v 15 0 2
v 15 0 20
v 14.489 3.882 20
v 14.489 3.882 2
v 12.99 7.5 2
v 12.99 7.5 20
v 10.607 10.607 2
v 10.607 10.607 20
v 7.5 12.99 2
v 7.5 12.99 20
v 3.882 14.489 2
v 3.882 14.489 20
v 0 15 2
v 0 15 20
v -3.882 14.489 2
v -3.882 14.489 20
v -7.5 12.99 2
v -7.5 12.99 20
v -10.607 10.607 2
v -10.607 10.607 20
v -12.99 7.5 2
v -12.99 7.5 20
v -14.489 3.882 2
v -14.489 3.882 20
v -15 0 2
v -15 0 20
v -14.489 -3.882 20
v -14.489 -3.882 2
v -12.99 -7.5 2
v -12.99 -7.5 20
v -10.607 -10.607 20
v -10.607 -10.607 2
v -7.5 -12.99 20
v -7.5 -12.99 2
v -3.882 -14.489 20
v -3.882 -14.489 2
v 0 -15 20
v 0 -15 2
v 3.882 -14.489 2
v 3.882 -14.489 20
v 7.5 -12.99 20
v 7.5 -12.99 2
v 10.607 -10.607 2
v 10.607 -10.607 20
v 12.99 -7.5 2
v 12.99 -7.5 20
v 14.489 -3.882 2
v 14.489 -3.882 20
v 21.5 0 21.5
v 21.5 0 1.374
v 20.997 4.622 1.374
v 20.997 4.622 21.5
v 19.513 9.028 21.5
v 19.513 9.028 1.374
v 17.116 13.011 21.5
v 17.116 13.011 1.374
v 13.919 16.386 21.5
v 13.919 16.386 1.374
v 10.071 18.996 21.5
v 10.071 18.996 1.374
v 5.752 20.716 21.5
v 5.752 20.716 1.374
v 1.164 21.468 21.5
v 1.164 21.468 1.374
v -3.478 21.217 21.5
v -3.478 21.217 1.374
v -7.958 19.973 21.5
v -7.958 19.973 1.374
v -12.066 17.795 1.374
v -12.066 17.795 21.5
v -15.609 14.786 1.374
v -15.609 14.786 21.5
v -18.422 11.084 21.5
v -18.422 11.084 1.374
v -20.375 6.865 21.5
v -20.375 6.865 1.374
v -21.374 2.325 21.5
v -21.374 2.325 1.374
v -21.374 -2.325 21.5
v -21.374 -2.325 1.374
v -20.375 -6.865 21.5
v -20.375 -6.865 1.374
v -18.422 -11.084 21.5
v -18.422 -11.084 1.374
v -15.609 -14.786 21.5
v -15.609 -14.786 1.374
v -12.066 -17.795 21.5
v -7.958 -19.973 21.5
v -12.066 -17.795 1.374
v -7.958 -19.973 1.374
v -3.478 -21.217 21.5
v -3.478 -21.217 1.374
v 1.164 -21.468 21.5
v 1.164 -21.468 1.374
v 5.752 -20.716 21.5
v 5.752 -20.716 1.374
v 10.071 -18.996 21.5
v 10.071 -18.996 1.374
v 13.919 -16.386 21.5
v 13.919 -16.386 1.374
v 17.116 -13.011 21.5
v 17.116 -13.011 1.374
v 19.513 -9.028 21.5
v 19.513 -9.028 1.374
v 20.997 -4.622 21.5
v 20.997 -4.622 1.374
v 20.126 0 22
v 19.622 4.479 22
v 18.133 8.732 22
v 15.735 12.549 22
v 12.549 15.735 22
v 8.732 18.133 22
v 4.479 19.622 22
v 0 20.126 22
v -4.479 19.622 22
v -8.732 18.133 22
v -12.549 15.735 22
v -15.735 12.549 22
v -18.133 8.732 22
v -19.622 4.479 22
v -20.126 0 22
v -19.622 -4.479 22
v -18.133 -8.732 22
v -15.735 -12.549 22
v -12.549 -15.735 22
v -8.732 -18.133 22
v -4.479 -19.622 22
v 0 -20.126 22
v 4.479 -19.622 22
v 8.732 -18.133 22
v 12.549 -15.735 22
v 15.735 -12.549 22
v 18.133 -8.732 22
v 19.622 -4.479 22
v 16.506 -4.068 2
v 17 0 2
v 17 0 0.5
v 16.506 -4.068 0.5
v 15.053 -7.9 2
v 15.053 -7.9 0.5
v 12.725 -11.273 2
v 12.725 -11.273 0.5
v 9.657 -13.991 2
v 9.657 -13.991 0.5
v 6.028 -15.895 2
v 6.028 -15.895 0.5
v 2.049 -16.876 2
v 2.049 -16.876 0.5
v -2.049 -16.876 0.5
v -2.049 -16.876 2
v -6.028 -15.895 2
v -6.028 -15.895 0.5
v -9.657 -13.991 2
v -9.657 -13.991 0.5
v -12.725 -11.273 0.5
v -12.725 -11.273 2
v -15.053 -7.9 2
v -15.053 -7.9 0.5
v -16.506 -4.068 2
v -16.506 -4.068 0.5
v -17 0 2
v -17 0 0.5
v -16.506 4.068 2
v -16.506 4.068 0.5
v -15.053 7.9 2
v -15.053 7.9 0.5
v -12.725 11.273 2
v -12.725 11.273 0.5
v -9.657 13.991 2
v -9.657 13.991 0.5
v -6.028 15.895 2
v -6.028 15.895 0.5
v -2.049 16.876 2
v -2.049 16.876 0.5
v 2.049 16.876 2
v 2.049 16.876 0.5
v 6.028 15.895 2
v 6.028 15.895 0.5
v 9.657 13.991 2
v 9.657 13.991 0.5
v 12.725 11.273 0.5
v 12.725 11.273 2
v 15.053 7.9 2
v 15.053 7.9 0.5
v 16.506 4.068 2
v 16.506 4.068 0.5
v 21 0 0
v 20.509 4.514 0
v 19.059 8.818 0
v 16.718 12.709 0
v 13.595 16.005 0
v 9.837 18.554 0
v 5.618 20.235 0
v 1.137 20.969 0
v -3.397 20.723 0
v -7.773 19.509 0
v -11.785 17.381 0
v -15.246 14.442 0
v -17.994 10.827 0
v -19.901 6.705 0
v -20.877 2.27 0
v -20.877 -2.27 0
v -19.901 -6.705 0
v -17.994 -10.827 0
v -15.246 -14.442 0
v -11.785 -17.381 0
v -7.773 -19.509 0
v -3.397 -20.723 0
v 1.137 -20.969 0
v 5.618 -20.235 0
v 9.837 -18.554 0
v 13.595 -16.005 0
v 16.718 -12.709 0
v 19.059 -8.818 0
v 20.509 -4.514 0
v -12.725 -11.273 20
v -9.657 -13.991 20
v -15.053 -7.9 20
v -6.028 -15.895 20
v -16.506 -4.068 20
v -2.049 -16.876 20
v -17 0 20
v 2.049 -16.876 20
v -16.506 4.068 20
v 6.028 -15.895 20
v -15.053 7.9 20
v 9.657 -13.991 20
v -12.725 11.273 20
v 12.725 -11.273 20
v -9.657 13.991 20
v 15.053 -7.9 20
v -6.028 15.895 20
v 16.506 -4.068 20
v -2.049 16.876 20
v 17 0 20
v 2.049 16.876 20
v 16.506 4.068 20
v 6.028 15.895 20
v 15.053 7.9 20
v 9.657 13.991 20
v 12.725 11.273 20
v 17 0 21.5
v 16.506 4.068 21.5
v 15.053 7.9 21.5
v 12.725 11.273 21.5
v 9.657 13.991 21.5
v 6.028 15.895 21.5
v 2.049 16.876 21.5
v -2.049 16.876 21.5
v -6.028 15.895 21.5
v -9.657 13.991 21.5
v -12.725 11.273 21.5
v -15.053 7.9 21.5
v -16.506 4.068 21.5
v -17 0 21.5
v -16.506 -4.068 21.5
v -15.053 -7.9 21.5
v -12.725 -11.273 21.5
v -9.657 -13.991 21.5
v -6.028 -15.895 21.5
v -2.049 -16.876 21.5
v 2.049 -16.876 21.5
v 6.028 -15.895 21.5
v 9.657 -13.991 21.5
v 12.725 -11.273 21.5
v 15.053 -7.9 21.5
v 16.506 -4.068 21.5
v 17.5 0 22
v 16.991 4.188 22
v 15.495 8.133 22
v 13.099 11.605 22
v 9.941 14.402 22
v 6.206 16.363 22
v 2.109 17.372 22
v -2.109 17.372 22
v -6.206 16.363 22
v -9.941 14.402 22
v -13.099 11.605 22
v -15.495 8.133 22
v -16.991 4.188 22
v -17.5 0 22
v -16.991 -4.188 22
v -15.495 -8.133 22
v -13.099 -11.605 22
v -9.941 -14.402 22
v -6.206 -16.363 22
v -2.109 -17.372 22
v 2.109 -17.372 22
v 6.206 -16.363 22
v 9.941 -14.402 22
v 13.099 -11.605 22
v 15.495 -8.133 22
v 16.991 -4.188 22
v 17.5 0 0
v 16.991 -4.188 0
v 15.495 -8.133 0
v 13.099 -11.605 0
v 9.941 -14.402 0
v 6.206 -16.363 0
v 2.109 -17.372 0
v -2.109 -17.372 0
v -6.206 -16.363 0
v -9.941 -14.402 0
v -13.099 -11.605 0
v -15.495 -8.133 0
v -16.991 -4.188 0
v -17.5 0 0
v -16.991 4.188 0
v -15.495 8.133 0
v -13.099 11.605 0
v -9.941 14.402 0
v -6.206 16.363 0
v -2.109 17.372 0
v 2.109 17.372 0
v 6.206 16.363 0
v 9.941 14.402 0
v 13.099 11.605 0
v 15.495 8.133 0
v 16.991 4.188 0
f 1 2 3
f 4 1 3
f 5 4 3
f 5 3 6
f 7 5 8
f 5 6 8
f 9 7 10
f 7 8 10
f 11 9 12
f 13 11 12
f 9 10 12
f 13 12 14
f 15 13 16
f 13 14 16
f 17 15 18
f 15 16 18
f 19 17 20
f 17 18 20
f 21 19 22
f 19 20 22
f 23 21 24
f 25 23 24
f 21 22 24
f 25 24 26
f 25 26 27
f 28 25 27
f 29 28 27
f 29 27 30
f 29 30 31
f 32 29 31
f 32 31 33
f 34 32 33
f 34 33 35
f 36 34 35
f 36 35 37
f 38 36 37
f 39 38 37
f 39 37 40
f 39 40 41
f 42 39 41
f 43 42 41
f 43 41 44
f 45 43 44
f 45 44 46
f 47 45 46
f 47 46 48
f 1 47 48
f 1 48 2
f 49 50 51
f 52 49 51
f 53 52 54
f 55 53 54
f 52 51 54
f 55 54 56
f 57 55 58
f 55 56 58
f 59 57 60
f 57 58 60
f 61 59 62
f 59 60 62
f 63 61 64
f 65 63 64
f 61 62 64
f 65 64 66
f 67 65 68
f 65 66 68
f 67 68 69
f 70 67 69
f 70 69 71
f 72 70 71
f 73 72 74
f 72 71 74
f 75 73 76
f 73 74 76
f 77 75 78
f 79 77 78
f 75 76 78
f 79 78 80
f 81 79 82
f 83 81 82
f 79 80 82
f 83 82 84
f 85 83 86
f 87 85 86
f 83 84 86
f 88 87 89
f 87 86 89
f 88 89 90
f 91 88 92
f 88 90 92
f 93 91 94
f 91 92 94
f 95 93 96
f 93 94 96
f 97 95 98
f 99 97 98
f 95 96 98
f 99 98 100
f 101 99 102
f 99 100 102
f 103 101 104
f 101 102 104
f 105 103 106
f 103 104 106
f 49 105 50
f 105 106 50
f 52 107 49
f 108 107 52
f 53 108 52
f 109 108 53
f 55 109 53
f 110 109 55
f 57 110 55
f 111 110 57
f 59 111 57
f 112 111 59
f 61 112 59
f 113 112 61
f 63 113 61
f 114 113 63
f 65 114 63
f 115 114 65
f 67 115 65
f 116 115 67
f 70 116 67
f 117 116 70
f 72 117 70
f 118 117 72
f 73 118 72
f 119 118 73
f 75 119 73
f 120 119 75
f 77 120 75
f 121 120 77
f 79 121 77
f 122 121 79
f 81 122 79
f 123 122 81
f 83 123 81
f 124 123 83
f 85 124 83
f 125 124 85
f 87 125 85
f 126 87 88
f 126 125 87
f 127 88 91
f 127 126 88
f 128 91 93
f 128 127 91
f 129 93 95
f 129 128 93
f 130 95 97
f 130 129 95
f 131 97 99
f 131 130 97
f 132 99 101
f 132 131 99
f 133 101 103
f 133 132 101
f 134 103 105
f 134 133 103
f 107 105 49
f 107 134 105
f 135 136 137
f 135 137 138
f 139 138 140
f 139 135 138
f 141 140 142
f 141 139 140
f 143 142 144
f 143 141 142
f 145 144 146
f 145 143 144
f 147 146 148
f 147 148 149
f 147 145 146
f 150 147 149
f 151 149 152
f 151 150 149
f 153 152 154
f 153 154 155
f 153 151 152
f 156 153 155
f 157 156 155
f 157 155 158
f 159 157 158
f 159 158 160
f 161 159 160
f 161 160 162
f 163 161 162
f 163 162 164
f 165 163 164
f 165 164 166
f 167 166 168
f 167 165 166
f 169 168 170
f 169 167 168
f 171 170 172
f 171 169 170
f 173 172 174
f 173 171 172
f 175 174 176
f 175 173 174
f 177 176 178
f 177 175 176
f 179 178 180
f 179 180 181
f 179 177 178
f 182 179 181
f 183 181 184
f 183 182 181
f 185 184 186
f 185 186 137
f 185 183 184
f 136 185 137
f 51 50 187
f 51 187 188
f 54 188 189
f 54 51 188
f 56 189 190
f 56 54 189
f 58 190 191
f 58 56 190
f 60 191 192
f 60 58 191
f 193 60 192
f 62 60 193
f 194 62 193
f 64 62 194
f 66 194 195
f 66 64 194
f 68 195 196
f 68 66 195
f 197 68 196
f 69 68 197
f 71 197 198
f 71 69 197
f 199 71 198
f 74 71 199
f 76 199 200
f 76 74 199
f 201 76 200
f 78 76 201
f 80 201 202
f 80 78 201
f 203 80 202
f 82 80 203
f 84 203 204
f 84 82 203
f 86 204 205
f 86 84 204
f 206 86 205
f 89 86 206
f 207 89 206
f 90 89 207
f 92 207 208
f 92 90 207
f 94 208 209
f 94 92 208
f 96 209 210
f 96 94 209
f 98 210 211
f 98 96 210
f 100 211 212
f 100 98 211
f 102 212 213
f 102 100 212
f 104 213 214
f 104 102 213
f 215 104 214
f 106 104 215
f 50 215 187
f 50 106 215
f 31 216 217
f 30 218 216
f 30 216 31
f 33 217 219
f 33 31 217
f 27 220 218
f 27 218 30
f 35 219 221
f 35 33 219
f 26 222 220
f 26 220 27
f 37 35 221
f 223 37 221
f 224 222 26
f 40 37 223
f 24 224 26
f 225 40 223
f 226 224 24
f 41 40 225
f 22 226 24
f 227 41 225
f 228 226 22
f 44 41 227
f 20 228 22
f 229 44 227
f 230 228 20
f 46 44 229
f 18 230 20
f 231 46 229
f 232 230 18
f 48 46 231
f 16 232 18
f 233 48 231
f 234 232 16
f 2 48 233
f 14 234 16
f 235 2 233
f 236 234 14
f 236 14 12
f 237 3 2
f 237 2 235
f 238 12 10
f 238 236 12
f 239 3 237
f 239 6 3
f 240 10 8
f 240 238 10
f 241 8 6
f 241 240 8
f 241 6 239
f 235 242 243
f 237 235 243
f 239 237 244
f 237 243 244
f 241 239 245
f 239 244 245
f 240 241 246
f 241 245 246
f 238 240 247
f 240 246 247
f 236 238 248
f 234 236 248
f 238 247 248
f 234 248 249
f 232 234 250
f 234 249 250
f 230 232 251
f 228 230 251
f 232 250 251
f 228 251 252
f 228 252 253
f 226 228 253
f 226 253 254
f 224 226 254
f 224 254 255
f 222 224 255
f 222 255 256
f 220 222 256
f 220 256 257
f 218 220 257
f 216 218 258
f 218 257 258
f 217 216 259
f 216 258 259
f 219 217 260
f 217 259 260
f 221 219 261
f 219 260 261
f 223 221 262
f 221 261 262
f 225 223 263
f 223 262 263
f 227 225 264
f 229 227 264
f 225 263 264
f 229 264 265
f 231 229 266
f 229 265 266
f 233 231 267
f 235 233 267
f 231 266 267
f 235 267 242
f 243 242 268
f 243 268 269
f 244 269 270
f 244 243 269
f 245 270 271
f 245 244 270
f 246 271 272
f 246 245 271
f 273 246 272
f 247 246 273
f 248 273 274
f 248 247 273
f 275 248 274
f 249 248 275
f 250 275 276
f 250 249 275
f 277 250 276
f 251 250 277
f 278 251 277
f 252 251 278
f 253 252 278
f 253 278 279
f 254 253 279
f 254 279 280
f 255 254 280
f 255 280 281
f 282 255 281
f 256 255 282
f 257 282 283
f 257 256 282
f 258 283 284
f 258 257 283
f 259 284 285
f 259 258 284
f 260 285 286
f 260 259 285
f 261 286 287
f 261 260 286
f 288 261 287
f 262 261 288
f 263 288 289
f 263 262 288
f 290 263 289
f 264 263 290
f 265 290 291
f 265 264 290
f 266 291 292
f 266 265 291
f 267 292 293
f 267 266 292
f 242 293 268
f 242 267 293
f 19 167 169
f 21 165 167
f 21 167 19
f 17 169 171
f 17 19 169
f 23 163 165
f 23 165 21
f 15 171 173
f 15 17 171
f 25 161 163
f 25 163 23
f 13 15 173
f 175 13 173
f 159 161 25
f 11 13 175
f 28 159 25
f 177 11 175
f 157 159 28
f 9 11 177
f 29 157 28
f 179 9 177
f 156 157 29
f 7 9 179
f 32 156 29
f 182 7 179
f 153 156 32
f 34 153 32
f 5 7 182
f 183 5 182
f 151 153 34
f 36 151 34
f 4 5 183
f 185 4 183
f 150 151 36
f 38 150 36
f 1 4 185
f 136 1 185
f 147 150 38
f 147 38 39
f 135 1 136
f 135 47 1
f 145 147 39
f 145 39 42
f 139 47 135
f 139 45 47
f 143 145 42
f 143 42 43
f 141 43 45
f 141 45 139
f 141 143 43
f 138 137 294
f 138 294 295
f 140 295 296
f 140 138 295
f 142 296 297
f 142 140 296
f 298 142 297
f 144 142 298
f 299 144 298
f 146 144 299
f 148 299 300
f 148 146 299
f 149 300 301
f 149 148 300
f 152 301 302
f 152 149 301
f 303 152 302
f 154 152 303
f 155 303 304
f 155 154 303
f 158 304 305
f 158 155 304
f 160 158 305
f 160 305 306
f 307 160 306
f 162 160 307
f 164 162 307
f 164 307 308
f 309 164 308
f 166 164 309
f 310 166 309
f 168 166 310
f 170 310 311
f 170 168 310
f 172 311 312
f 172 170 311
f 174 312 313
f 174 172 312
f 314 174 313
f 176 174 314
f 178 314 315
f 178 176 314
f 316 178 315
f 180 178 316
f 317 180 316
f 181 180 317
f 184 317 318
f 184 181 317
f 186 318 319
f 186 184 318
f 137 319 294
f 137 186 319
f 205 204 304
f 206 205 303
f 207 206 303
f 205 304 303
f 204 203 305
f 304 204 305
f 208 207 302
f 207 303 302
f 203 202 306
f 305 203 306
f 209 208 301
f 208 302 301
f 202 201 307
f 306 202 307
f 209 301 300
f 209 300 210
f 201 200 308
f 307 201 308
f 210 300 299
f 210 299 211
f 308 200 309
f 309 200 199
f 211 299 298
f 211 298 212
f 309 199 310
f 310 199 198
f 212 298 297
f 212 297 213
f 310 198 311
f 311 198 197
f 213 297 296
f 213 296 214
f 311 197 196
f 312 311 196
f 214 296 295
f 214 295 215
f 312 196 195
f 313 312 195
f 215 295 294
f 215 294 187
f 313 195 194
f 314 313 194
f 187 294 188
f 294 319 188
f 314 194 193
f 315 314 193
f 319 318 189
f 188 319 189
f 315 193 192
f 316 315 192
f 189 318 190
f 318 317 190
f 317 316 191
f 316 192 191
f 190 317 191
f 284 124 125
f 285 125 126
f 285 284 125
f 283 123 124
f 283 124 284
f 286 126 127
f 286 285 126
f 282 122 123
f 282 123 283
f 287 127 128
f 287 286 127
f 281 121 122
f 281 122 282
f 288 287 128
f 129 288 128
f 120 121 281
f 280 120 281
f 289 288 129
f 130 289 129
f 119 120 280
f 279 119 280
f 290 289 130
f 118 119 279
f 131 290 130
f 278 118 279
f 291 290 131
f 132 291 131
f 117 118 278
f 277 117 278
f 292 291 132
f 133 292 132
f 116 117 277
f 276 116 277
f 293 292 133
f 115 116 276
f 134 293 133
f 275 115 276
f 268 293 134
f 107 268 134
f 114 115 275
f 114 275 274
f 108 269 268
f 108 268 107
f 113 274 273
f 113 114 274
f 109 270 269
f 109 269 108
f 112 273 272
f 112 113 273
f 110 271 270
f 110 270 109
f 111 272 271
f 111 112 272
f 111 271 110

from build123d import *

# Parameters (mm, degrees)
SKETCH1_R           = 21.5
BOSS_EXTRUDE1_DEPTH = 22
SKETCH3_R           = 15
CUT_EXTRUDE1_DEPTH  = 22
SKETCH4_R           = 17
CUT_EXTRUDE2_DEPTH  = 2
CUT_EXTRUDE3_START  = -2
SKETCH5_R           = 17
CUT_EXTRUDE3_DEPTH  = 2
CHAMFER1_SIZE       = 0.5
CHAMFER3_SIZE       = 0.5
CHAMFER3_SIZE2      = 1.37373871
CHAMFER5_SIZE       = 0.5
CHAMFER5_SIZE2      = 1.37373871


with BuildPart() as part:
    # Sketch1 → Boss-Extrude1 (new body)
    with BuildSketch(Plane.XY):
        Circle(SKETCH1_R)
    extrude(amount=BOSS_EXTRUDE1_DEPTH)

    # Sketch3 → Cut-Extrude1 (cut)
    with BuildSketch(Plane.XY.offset(22)):
        Circle(SKETCH3_R)
    extrude(amount=-CUT_EXTRUDE1_DEPTH, mode=Mode.SUBTRACT)

    # Sketch4 → Cut-Extrude2 (cut)
    with BuildSketch(Plane.XY.offset(22)):
        Circle(SKETCH4_R)
    extrude(amount=-CUT_EXTRUDE2_DEPTH, mode=Mode.SUBTRACT)

    # Sketch5 → Cut-Extrude3 (cut)
    with BuildSketch(Plane(origin=(0, 0, 0), x_dir=(-1, 0, 0), z_dir=(0, 0, -1)).offset(CUT_EXTRUDE3_START)):
        with Locations(Location((0, 0, 0), (0, 0, 180))):
            Circle(SKETCH5_R)
    extrude(amount=CUT_EXTRUDE3_DEPTH, mode=Mode.SUBTRACT)

    # Chamfer1
    chamfer1_edges = [part.edges().sort_by_distance(p)[0] for p in [
        (-17, 0, 22),
        (-17, 0, 0),
    ]]
    chamfer(chamfer1_edges, length=CHAMFER1_SIZE)

    # Chamfer3
    chamfer3_edges = [part.edges().sort_by_distance(p)[0] for p in [
        (-21.5, 0, 0),
    ]]
    chamfer3_side = [part.faces().sort_by_distance(p)[0] for p in [
        (-18.108111832, 0, 0),
    ]]
    chamfer(chamfer3_edges, length=CHAMFER3_SIZE, length2=CHAMFER3_SIZE2, reference=chamfer3_side[0])

    # Chamfer5
    chamfer5_edges = [part.edges().sort_by_distance(p)[0] for p in [
        (-21.5, 0, 22),
    ]]
    chamfer5_side = [part.faces().sort_by_distance(p)[0] for p in [
        (-21.5, 0, 11.686869355),
    ]]
    chamfer(chamfer5_edges, length=CHAMFER5_SIZE, length2=CHAMFER5_SIZE2, reference=chamfer5_side[0])


solid = part.part
